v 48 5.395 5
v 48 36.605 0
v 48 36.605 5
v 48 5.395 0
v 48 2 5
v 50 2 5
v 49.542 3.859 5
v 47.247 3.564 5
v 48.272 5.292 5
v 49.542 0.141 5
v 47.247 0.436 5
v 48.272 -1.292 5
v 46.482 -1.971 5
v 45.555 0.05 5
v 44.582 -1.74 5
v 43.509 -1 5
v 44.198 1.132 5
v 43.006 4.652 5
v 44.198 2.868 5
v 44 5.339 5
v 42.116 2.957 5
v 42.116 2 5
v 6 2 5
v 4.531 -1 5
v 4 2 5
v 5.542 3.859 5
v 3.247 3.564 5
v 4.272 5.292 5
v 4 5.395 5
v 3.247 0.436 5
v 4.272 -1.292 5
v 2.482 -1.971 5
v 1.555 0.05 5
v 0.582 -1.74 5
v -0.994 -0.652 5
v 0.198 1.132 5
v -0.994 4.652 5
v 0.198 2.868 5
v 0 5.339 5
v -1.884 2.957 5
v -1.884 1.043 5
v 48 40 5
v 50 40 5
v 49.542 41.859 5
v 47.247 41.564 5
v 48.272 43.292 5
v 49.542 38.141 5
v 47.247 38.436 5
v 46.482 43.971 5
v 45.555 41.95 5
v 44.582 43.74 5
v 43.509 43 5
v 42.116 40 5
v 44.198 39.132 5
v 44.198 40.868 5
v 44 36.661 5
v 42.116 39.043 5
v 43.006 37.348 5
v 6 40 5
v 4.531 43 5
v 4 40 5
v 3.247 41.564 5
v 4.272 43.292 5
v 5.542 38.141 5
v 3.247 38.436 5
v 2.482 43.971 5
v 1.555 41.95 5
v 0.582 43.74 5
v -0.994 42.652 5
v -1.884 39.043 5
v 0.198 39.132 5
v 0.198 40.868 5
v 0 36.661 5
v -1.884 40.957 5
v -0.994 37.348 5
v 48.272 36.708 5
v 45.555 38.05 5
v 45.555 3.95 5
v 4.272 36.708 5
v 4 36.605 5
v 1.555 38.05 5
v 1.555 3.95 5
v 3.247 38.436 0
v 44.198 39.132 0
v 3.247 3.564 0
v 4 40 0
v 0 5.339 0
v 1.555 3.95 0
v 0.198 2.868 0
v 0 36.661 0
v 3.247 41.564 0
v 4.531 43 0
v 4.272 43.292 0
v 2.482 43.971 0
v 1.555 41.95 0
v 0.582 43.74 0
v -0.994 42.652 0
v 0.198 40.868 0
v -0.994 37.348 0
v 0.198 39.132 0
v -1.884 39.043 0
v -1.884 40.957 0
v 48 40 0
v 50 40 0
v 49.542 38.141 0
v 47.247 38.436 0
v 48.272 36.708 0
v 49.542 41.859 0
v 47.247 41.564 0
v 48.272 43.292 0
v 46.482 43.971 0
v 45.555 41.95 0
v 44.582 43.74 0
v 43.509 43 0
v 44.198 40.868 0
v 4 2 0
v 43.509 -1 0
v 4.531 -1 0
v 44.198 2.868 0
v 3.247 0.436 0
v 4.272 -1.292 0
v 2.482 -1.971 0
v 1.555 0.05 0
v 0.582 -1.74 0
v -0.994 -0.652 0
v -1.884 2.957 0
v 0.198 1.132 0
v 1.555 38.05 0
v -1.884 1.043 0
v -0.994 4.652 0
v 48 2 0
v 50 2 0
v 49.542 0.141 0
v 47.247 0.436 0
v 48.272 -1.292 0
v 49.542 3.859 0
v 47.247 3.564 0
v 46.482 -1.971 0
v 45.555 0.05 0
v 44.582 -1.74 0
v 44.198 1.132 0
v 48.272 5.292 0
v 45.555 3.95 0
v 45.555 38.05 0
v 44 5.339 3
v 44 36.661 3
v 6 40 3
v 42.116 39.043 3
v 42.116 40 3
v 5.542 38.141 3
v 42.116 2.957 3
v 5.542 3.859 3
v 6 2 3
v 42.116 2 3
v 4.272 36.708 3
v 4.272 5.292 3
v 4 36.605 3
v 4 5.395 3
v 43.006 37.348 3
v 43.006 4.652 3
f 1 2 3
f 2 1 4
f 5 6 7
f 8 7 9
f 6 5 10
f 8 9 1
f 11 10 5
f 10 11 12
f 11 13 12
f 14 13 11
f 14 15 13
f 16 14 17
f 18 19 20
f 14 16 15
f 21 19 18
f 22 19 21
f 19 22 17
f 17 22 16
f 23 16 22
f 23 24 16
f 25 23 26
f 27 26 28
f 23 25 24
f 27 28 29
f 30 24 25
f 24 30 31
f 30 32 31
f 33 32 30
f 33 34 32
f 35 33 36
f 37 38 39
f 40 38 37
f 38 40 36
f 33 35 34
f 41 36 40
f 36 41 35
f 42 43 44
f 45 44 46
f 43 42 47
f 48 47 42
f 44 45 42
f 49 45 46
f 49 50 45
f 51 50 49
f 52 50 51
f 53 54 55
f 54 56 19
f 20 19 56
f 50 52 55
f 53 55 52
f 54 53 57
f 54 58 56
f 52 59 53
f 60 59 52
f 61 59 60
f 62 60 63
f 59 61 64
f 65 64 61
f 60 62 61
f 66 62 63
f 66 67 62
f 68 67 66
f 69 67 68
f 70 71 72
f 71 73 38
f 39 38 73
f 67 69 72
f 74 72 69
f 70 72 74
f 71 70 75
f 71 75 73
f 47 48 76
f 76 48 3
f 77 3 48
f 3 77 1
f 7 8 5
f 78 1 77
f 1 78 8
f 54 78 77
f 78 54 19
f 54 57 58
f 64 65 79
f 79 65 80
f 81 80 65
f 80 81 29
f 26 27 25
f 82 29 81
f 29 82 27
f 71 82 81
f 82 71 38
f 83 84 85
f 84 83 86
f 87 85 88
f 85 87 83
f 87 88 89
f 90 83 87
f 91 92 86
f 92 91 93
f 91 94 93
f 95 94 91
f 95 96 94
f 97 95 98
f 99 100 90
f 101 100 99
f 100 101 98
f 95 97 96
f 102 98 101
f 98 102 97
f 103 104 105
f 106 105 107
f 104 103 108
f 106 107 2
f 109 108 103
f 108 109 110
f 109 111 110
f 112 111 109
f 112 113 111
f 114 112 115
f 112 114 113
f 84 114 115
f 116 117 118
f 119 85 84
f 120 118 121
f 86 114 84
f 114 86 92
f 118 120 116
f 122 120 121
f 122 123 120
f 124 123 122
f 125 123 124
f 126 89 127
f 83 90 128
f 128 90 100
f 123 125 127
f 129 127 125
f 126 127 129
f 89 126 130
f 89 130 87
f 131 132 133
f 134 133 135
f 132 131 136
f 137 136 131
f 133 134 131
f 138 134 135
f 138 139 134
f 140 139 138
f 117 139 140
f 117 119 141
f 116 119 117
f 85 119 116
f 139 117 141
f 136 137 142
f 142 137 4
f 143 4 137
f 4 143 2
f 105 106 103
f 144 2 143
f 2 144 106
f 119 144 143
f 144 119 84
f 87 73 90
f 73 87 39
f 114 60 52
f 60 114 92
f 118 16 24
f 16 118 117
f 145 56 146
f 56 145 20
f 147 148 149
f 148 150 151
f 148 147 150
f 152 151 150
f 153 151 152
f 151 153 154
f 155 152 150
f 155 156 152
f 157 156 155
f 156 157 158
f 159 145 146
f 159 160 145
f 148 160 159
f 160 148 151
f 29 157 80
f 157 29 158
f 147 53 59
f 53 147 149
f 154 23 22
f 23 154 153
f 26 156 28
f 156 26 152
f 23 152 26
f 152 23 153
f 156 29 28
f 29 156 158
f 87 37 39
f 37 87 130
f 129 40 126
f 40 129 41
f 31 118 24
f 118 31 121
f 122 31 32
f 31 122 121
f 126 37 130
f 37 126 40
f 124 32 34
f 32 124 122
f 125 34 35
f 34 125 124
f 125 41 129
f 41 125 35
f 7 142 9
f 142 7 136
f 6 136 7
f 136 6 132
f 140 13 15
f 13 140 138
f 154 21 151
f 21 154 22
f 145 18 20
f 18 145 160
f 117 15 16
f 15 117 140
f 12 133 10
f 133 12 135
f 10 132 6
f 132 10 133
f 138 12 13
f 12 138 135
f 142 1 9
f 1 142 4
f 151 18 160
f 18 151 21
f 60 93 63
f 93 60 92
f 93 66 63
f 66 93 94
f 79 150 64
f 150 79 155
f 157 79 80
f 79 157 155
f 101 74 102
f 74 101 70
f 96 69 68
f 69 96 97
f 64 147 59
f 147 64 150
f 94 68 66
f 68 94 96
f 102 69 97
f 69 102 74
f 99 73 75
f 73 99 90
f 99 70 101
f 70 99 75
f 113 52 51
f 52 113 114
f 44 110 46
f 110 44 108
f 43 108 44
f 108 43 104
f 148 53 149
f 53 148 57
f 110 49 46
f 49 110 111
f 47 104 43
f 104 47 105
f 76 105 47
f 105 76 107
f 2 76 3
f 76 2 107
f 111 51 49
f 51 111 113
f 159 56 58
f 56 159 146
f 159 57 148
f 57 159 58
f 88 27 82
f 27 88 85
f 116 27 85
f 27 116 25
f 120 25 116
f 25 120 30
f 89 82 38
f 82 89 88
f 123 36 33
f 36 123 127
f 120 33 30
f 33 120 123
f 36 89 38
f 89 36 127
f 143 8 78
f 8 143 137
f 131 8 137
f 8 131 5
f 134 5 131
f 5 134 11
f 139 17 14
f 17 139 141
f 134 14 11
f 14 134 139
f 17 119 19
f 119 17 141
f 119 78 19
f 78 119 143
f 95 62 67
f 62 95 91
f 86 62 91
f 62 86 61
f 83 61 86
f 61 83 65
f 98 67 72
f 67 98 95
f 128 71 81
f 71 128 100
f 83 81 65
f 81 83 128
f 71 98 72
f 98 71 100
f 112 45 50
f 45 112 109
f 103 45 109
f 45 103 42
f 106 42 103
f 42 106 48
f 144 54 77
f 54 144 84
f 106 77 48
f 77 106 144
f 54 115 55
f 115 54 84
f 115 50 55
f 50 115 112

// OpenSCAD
/* 
 * 2016, bruno.keymolen@gmail.com
 */
 
height = 5;

module base1()
{
    difference()
    {
        translate([0,-1,0])
        {
            cube(size=[48, 44, height], center=false);
        }
        translate([4,2,3])
        {
            cube(size=[40, 38, 2], center=false);
        }  
    }
}

module base2()
{
    base1();
    translate([2,2,0])
    cylinder(h=height, r1=4, r2=4);
    translate([46,2,0])
    cylinder(h=height, r1=4, r2=4);
    translate([2,40,0])
    cylinder(h=height, r1=4, r2=4);
    translate([46,40,0])
    cylinder(h=height, r1=4, r2=4);
}

module base3()
{
    difference()
    {
        base2();
        translate([2,2,0])
        cylinder(h=height, r1=2, r2=2);
        translate([46,2,0])
        cylinder(h=height, r1=2, r2=2);
        translate([2,40,0])
        cylinder(h=height, r1=2, r2=2);
        translate([46,40,0])
        cylinder(h=height, r1=2, r2=2);
    }
}

base3();
